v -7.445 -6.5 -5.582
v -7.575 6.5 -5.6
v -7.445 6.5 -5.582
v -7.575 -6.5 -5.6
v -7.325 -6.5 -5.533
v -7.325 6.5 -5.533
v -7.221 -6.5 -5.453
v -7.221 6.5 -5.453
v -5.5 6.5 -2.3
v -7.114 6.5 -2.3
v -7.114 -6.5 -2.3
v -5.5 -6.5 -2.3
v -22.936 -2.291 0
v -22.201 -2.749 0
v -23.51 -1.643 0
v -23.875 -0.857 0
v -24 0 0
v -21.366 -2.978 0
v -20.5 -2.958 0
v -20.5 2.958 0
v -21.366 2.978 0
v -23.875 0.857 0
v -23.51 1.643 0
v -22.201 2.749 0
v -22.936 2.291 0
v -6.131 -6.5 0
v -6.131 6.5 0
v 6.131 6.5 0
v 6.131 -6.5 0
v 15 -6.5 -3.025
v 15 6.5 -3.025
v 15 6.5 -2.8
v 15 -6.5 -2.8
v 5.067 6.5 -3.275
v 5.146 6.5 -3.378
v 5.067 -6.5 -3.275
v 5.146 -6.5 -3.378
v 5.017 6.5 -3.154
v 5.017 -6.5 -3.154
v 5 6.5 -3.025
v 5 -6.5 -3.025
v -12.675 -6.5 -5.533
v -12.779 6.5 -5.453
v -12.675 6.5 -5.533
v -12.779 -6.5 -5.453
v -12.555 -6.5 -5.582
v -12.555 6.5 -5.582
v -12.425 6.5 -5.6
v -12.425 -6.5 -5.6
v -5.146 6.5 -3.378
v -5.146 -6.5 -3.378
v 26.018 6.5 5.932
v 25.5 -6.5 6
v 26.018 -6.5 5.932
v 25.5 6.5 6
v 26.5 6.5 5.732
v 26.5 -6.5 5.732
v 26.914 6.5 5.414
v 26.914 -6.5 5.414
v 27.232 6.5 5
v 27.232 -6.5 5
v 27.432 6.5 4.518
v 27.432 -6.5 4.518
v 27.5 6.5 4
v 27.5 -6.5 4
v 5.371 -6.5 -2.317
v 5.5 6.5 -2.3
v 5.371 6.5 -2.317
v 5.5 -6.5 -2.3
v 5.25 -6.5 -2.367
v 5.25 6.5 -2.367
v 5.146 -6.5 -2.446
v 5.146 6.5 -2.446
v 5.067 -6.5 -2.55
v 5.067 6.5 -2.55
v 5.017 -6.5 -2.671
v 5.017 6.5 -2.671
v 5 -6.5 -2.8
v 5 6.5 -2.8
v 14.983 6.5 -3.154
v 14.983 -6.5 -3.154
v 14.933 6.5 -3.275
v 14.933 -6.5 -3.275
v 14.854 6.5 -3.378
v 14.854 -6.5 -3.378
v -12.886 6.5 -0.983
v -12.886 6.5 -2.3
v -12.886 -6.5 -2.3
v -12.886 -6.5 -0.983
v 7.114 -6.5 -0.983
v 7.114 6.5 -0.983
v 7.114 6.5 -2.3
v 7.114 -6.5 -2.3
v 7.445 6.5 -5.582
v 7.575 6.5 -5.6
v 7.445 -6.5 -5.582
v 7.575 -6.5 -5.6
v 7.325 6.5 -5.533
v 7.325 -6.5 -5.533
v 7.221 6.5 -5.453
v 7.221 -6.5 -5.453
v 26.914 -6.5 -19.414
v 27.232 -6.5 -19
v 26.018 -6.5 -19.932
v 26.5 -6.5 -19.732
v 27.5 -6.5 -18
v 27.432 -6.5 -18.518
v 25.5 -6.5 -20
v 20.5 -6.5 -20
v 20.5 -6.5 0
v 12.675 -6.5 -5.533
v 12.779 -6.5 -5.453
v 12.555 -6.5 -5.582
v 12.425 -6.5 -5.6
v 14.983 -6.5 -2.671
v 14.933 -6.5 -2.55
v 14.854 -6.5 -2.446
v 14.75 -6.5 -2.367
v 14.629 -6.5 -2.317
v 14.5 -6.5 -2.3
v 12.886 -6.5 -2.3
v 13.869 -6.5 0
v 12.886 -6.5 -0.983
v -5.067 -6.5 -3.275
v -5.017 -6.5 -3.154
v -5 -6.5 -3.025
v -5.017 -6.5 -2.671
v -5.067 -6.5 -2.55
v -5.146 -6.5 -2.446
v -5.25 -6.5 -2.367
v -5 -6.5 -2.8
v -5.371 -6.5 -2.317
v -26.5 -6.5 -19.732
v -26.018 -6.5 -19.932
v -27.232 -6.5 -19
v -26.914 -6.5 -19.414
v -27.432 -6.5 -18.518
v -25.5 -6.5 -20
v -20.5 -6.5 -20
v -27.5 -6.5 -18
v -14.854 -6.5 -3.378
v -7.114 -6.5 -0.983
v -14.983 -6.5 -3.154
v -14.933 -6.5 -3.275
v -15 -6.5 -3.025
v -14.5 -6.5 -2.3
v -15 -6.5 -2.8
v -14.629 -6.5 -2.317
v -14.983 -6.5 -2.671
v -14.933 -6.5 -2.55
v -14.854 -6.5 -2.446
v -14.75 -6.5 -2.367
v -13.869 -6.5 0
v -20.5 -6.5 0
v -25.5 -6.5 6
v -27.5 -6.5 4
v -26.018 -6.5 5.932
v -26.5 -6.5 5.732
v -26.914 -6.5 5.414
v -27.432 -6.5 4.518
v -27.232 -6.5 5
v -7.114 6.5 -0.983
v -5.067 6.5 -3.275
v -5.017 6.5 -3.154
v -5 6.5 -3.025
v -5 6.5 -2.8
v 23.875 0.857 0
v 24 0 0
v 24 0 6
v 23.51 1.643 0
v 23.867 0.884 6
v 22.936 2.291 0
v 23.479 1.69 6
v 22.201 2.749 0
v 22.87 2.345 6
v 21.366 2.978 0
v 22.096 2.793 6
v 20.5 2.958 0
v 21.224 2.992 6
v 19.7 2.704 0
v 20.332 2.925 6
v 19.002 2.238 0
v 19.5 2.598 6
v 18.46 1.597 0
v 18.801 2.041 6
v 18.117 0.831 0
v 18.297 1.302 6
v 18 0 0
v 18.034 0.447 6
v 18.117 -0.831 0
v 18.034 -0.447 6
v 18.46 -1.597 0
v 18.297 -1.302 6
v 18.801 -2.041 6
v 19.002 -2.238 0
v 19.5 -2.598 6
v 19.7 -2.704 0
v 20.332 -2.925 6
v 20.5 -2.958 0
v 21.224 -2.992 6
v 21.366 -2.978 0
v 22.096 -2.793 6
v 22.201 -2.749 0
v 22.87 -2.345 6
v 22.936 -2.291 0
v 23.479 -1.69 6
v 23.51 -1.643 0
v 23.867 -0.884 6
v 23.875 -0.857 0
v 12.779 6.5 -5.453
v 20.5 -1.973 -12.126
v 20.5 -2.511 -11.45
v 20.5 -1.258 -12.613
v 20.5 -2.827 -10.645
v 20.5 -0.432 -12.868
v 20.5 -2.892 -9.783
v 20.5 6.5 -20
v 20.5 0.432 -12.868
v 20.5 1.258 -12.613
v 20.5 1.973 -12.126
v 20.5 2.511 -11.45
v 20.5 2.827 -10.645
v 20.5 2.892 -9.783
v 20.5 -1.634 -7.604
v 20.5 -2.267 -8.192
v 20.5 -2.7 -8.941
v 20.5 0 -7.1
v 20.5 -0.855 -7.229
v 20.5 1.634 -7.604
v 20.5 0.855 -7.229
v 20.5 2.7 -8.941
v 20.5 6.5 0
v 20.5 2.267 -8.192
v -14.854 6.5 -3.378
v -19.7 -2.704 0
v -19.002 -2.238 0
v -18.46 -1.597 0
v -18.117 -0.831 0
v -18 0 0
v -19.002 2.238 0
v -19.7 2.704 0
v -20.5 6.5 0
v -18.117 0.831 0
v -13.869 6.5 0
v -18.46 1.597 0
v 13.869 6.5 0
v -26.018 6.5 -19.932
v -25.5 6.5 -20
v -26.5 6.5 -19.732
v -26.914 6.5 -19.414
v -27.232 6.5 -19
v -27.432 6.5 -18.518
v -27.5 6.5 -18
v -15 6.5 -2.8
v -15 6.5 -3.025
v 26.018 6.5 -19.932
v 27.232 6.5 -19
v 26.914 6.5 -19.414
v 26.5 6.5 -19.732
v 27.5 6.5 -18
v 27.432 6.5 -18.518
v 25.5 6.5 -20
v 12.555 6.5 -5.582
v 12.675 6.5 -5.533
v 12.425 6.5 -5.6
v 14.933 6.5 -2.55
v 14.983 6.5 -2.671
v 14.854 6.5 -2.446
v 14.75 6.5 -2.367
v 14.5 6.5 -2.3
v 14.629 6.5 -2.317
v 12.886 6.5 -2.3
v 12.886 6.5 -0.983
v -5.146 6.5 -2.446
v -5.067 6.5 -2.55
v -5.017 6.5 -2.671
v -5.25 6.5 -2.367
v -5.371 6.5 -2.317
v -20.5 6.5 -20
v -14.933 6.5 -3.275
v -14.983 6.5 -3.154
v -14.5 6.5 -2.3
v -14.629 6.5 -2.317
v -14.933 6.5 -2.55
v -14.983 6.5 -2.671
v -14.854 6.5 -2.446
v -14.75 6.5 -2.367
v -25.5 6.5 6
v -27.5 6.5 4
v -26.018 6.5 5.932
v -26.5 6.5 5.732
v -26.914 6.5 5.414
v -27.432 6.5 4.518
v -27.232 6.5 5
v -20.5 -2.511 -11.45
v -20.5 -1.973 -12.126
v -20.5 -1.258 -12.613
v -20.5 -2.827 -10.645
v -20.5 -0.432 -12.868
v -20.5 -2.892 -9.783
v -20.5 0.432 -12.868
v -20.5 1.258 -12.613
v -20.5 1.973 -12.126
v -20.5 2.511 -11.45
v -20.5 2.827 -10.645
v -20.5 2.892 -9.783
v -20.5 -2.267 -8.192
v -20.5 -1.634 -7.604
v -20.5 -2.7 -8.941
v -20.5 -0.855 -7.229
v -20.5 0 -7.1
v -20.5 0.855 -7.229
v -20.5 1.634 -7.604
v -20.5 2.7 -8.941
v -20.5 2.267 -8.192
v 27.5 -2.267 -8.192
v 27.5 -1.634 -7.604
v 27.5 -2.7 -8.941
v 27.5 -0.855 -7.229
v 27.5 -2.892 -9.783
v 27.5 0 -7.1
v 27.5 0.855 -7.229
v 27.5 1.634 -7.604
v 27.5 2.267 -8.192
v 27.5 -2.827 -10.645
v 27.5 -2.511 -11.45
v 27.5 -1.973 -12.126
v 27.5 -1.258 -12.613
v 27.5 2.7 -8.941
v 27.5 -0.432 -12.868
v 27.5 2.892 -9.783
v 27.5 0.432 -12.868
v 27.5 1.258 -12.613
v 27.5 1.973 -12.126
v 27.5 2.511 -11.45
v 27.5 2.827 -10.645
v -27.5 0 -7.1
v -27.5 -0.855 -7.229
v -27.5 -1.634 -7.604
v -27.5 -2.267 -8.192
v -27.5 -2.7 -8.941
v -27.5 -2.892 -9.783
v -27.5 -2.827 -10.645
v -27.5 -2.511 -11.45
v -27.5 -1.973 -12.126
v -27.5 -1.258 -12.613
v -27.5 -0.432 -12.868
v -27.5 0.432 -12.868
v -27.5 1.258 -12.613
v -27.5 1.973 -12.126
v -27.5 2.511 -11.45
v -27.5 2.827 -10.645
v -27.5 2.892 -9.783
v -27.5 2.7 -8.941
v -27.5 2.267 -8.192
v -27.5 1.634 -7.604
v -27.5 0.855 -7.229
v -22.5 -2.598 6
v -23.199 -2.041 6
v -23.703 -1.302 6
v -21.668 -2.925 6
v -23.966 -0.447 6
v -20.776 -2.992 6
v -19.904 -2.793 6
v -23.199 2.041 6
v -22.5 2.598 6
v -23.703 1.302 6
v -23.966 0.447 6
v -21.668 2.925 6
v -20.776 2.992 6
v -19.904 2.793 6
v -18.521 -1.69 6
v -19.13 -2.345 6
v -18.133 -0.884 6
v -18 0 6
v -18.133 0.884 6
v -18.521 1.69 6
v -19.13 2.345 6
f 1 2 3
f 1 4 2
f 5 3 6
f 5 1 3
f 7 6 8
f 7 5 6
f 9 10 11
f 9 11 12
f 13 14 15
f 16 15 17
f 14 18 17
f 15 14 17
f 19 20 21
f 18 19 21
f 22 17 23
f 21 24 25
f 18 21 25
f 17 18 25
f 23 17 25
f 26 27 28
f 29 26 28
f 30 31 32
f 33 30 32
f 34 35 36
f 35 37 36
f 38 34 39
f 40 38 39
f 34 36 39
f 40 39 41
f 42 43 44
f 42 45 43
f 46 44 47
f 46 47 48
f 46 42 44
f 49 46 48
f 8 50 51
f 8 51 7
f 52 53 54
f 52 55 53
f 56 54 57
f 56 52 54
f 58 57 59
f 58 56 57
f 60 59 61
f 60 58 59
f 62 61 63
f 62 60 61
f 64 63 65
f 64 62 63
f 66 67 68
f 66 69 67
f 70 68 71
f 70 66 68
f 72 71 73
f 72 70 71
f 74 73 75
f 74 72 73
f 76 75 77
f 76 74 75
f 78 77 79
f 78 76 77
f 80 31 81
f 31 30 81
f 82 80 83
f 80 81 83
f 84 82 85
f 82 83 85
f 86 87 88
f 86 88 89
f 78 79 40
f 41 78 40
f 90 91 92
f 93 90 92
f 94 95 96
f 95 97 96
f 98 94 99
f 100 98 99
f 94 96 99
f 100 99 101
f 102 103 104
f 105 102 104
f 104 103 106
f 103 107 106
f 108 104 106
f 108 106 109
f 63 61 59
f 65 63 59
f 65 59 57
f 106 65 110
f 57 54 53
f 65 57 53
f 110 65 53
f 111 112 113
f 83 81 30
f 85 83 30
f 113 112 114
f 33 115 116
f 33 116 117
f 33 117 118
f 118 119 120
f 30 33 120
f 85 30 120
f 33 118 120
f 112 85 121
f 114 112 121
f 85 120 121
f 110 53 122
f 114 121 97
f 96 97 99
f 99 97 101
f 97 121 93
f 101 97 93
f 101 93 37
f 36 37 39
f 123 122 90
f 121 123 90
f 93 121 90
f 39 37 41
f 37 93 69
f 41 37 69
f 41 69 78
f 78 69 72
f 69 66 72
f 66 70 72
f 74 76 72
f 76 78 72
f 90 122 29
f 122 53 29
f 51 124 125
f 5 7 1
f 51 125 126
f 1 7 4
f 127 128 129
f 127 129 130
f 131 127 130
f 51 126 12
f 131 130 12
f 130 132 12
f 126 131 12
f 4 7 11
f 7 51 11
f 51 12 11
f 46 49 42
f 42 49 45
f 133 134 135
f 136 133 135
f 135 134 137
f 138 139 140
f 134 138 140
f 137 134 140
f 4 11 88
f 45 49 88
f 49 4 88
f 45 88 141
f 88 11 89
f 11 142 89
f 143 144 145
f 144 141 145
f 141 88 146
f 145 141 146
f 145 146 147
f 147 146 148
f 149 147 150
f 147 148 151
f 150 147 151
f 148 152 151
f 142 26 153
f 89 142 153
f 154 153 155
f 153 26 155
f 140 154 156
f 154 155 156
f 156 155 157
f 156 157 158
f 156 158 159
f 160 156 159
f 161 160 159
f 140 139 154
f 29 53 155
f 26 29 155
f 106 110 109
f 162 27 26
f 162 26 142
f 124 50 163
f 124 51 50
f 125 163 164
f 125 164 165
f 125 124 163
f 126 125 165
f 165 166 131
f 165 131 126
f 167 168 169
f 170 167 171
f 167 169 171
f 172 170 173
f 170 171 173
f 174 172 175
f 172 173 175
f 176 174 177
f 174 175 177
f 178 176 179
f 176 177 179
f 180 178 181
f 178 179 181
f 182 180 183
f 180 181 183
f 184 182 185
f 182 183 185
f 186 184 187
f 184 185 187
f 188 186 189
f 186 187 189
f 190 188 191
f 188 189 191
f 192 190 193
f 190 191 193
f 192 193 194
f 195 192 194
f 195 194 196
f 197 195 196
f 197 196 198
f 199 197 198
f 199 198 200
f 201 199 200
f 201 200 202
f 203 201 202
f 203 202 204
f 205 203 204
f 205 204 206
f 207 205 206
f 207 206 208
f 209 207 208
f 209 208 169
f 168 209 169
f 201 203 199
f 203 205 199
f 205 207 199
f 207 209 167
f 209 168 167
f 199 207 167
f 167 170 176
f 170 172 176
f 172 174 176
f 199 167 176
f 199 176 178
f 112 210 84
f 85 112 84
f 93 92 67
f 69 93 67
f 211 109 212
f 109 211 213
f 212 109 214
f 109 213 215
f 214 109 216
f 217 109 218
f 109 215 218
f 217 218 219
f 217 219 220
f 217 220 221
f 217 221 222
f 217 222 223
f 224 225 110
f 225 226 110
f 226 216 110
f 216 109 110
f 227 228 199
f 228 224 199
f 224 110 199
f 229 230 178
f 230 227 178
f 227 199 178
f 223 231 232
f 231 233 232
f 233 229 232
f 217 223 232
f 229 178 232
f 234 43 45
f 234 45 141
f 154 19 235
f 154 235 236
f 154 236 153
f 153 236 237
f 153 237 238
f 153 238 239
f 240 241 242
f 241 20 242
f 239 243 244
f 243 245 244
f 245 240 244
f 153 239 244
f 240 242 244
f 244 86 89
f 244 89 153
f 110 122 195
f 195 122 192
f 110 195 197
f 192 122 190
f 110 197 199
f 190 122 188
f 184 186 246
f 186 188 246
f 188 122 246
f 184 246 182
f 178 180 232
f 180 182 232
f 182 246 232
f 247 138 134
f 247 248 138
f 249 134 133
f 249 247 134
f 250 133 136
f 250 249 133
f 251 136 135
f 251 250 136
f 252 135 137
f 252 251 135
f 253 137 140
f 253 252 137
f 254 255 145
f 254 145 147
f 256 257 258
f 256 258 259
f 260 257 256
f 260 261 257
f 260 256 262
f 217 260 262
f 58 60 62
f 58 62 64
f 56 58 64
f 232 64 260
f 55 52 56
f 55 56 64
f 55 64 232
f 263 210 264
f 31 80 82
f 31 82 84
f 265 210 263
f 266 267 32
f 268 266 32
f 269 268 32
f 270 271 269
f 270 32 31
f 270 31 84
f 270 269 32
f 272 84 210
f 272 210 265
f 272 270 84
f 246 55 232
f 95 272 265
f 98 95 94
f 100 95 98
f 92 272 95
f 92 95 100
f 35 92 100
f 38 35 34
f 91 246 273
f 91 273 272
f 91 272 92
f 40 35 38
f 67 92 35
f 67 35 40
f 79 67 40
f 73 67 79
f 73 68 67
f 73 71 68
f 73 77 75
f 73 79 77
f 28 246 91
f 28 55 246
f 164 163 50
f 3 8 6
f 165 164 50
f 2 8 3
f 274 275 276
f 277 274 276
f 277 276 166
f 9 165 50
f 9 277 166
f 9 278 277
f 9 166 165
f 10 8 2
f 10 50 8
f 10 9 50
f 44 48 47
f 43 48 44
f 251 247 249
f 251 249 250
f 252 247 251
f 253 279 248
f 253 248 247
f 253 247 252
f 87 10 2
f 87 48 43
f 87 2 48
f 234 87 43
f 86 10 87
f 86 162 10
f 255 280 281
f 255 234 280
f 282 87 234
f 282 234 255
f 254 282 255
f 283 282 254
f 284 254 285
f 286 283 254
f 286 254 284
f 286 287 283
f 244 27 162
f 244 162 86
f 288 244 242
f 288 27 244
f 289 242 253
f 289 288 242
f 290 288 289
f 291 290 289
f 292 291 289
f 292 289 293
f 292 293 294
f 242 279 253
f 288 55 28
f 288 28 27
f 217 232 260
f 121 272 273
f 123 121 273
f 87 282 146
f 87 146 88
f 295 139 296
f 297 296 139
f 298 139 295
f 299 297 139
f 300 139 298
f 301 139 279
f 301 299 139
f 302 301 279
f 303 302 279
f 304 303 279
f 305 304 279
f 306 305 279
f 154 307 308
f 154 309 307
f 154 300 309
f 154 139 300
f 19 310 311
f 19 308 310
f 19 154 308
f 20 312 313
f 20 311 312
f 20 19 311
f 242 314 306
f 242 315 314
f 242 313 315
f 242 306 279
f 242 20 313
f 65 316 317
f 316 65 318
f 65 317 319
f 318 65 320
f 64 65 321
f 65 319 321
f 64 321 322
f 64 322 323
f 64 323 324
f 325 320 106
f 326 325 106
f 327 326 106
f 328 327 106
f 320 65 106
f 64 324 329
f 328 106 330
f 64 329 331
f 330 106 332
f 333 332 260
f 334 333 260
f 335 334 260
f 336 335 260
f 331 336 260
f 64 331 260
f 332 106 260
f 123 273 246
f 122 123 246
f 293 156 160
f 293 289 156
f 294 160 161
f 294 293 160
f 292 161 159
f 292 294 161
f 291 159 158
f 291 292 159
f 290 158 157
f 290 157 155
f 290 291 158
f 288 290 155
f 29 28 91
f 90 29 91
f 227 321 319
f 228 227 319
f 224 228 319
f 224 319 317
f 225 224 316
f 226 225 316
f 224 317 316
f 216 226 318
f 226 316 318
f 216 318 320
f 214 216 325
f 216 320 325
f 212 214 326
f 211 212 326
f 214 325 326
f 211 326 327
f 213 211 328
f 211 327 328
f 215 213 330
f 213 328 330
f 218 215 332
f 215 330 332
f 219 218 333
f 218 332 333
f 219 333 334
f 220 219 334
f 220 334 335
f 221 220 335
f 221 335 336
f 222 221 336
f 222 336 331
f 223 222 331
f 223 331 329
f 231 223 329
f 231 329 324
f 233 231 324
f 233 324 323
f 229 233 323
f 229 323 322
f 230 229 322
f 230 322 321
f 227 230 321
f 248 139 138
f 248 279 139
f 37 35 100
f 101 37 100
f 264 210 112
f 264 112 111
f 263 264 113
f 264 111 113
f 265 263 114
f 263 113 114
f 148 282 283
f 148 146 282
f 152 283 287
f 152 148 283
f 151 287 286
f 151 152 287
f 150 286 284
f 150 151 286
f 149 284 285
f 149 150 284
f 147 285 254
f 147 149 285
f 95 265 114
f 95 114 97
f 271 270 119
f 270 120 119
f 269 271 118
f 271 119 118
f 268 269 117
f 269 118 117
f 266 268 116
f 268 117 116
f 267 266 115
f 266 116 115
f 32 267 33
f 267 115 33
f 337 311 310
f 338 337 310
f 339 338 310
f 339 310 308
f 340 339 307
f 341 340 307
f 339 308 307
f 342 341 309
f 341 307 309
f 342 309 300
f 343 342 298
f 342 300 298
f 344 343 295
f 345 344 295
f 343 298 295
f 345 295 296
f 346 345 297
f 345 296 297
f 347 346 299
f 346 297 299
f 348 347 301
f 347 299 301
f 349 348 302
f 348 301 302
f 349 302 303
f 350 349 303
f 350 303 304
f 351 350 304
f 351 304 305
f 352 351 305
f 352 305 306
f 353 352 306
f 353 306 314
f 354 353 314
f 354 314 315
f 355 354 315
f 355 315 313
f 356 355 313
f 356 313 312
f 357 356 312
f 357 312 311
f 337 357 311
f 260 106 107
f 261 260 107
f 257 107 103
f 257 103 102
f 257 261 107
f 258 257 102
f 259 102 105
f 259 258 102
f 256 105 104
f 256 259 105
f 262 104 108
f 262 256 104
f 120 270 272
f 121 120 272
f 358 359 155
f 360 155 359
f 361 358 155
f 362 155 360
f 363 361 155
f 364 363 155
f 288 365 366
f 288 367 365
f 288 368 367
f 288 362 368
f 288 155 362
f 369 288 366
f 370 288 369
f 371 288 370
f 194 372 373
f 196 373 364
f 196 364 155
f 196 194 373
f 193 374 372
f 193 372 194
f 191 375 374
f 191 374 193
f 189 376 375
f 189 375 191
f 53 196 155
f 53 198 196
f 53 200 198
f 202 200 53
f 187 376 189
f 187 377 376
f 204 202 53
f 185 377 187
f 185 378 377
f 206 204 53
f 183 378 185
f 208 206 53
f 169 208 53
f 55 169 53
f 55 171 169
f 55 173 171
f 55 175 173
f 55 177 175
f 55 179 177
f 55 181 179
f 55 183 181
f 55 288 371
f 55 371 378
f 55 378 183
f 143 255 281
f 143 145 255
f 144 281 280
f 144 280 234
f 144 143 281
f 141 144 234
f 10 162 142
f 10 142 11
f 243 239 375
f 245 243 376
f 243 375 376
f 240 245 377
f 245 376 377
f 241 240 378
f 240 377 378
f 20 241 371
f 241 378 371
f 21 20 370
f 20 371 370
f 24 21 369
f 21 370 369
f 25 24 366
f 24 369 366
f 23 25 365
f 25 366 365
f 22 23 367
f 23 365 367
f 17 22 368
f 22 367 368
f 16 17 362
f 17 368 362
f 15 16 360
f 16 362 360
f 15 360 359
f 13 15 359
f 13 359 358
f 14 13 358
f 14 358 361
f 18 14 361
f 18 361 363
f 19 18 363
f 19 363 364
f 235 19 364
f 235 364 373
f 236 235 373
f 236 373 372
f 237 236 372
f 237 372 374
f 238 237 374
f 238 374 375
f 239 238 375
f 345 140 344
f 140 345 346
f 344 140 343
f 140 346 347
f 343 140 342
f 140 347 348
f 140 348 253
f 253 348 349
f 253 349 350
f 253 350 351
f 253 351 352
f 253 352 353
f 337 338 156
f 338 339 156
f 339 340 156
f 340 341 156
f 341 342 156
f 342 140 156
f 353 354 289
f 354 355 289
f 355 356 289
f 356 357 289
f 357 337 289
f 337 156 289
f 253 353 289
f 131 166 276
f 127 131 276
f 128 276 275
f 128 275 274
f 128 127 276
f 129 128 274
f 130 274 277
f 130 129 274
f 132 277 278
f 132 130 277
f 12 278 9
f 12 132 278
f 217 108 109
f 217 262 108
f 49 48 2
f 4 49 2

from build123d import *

# Parameters (mm, degrees)
SKETCH1_W            = 55
SKETCH1_H            = 13
BOSS_EXTRUDE1_DEPTH  = 10
SKETCH2_W            = 55
SKETCH2_H            = 13
CUT_EXTRUDE1_DEPTH   = 4
CUT_EXTRUDE2_REACH   = 30.888
SKETCH4_R            = 3
BOSS_EXTRUDE3_DEPTH  = 13
SKETCH6_W            = 7
SKETCH6_H            = 13
BOSS_EXTRUDE4_DEPTH  = 20
M5_CLEARANCE_HOLE1_D = 5.8
FILLET1_R            = 2
FILLET2_R            = 0.5


with BuildPart() as part:
    # Sketch1 → Boss-Extrude1 (new body)
    with BuildSketch(Plane.XY):
        Rectangle(SKETCH1_W, SKETCH1_H)
    extrude(amount=BOSS_EXTRUDE1_DEPTH)

    # Sketch2 → Cut-Extrude1 (cut)
    with BuildSketch(Plane.XY.offset(10)):
        Rectangle(SKETCH2_W, SKETCH2_H)
    extrude(amount=-CUT_EXTRUDE1_DEPTH, mode=Mode.SUBTRACT)

    # Sketch4 → Cut-Extrude2 (cut, up to next)
    with BuildSketch(Plane.XY.offset(6), mode=Mode.PRIVATE) as cut_extrude2_sk1:
        with Locations((21, 0)):
            Circle(SKETCH4_R)
    cut_extrude2_tool1 = extrude(cut_extrude2_sk1.sketch, amount=-CUT_EXTRUDE2_REACH, mode=Mode.PRIVATE) & part.part
    # Sketch4 → Cut-Extrude2 (cut, up to next)
    with BuildSketch(Plane.XY.offset(6), mode=Mode.PRIVATE) as cut_extrude2_sk2:
        with Locations((-21, 0)):
            Circle(SKETCH4_R)
    cut_extrude2_tool2 = extrude(cut_extrude2_sk2.sketch, amount=-CUT_EXTRUDE2_REACH, mode=Mode.PRIVATE) & part.part
    add(cut_extrude2_tool1.solids().sort_by_distance((21, 0, 6))[0], mode=Mode.SUBTRACT)
    add(cut_extrude2_tool2.solids().sort_by_distance((-21, 0, 6))[0], mode=Mode.SUBTRACT)

    # Sketch5 → Boss-Extrude3 (add)
    with BuildSketch(Plane(origin=(0, 6.5, 0), x_dir=(1, 0, 0), z_dir=(0, 1, 0))):
        Polygon((9.9, 5.5995), (12.632393219, 5.5995), (15, 3.231893219), (15, 2.3), (12.8865, 2.3), (12.8865, 0.982893219), (13.869393219, 0), (6.130606781, 0), (7.1135, 0.982893219), (7.1135, 2.3), (5, 2.3), (5, 3.231893219), (7.367606781, 5.5995), align=None)
    boss_extrude3 = extrude(amount=-BOSS_EXTRUDE3_DEPTH)

    # Mirror1: Boss-Extrude3 across plane
    add(boss_extrude3.mirror(Plane(origin=(0, 0, 0), x_dir=(0, 0, 1), z_dir=(1, 0, 0))))

    # Sketch6 → Boss-Extrude4 (add)
    with BuildSketch(Plane(origin=(0, 0, 0), x_dir=(-1, 0, 0), z_dir=(0, 0, -1))):
        with Locations((24, 0)):
            Rectangle(SKETCH6_W, SKETCH6_H)
        with Locations((-24, 0)):
            Rectangle(SKETCH6_W, SKETCH6_H)
    extrude(amount=BOSS_EXTRUDE4_DEPTH)

    # M5 Clearance Hole1 (through all)
    with Locations(Plane(origin=(-27.5, 0, -10), x_dir=(0, 0, -1), z_dir=(-1, 0, 0))):
        with Locations((0, 0)):
            Hole(M5_CLEARANCE_HOLE1_D / 2)

    # Fillet1
    fillet1_edges = [part.edges().sort_by_distance(p)[0] for p in [
        (-27.5, 0, -20),
        (27.5, 0, -20),
        (-27.5, 0, 6),
        (27.5, 0, 6),
    ]]
    fillet(fillet1_edges, radius=FILLET1_R)

    # Fillet2
    fillet2_edges = [part.edges().sort_by_distance(p)[0] for p in [
        (12.632393219, 0, -5.5995),
        (15, 0, -3.231893219),
        (15, 0, -2.3),
        (5, 0, -2.3),
        (5, 0, -3.231893219),
        (7.367606781, 0, -5.5995),
        (-15, 0, -2.3),
        (-5, 0, -2.3),
        (-5, 0, -3.231893219),
        (-7.367606781, 0, -5.5995),
        (-12.632393219, 0, -5.5995),
        (-15, 0, -3.231893219),
    ]]
    fillet(fillet2_edges, radius=FILLET2_R)


solid = part.part
